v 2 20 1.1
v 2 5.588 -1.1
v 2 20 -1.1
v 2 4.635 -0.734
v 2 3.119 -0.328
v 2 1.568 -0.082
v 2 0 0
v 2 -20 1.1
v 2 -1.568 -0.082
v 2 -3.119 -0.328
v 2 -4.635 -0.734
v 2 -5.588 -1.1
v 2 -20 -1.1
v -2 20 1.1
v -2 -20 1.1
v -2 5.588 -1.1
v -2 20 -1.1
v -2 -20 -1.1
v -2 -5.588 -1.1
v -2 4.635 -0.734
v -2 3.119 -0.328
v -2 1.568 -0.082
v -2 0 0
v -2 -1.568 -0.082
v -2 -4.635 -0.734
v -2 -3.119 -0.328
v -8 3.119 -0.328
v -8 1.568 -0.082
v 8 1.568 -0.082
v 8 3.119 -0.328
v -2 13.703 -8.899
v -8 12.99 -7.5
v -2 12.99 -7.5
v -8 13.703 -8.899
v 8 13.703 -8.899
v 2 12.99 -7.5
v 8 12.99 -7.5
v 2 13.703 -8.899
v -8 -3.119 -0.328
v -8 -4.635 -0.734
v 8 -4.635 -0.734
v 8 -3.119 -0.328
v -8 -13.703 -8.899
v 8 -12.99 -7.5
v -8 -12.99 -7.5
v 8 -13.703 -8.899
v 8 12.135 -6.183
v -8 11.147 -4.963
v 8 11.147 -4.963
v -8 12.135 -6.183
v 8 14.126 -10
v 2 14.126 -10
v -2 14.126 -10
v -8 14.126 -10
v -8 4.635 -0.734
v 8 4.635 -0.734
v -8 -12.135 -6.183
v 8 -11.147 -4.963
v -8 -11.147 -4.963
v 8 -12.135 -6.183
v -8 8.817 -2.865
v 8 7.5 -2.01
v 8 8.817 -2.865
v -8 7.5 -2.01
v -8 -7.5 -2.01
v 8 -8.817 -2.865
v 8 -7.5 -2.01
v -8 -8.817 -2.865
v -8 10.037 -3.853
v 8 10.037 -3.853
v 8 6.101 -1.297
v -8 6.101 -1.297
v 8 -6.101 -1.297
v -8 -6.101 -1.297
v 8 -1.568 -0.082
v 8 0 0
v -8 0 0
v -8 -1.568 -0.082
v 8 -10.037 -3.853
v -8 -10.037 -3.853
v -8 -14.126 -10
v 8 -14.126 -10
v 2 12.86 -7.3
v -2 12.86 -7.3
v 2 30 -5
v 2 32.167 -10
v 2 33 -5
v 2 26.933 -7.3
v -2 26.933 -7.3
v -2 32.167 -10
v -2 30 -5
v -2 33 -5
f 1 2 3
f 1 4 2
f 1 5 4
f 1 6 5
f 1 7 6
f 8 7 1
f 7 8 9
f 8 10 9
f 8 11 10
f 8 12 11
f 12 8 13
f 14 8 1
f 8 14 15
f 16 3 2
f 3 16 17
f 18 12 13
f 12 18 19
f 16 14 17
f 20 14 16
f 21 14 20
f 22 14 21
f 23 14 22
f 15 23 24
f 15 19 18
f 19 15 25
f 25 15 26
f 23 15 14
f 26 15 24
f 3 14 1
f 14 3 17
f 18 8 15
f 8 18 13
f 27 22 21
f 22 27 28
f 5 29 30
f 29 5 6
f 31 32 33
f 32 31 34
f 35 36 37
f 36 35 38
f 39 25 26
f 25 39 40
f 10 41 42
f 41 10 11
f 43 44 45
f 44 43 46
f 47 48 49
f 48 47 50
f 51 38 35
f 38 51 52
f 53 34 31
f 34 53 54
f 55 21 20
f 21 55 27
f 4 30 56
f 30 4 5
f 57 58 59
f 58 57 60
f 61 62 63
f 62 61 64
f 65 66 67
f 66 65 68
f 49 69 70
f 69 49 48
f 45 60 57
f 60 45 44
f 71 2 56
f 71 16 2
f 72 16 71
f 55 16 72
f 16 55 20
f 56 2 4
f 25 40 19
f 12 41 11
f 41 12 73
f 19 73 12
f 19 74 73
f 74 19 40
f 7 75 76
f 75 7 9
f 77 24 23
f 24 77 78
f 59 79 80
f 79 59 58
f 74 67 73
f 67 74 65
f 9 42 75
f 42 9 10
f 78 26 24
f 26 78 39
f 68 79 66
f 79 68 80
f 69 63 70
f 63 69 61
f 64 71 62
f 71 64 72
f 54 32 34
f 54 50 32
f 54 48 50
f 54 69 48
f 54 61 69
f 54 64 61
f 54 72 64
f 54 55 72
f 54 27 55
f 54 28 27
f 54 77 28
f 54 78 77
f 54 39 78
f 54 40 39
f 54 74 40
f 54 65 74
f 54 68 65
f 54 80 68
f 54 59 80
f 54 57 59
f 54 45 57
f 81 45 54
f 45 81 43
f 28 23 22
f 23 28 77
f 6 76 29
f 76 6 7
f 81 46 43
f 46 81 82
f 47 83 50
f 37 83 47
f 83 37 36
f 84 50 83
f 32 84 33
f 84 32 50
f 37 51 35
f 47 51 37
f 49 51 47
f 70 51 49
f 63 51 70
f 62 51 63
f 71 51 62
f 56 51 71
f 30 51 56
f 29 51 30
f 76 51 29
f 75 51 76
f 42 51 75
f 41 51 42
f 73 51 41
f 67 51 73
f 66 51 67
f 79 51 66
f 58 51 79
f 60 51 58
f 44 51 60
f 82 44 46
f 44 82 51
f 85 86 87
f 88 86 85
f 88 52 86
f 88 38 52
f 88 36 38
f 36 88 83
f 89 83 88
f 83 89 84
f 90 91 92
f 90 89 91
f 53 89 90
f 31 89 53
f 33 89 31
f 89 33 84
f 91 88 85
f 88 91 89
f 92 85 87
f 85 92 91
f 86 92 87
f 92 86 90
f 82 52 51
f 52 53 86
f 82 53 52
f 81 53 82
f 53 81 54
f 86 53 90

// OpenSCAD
bladeX=4;
bladeY=30;
bladeZ=2.2;
$fn = 60;
module helo() {
    cube([bladeX, 40, bladeZ], true); // Blade

    translate([-8, 0, -bladeY/2]) rotate([0,90,0])  cylinder(h=16, r=(bladeY/2)); // Body

    translate([0, 20, -11+bladeZ]) cube([bladeX, 17, 3], true);


    VertPoints = [
      [  -2,  22,  -11 ],  //0
      [ 2,  22,  -11 ],  //1
      [ 2,  32,  -11 ],  //2
      [  -2,  32,  -11 ],  //3
      [  -2,  30,  -5 ],  //4
      [ 2,  30,  -5 ],  //5
      [ 2,  33,  -5 ],  //6
      [  -2,  33,  -5 ]]; //7
      
    BodyFaces = [
      [0,1,2,3],  // bottom
      [4,5,1,0],  // front
      [7,6,5,4],  // top
      [5,6,2,1],  // right
      [6,7,3,2],  // back
      [7,4,0,3]]; // left
      
    polyhedron(VertPoints, BodyFaces);
}
difference() {
    helo();
    translate([0,0,-(bladeY-5)]) cube([bladeY, bladeY*3, bladeY], true); // Remove bottom half
}
